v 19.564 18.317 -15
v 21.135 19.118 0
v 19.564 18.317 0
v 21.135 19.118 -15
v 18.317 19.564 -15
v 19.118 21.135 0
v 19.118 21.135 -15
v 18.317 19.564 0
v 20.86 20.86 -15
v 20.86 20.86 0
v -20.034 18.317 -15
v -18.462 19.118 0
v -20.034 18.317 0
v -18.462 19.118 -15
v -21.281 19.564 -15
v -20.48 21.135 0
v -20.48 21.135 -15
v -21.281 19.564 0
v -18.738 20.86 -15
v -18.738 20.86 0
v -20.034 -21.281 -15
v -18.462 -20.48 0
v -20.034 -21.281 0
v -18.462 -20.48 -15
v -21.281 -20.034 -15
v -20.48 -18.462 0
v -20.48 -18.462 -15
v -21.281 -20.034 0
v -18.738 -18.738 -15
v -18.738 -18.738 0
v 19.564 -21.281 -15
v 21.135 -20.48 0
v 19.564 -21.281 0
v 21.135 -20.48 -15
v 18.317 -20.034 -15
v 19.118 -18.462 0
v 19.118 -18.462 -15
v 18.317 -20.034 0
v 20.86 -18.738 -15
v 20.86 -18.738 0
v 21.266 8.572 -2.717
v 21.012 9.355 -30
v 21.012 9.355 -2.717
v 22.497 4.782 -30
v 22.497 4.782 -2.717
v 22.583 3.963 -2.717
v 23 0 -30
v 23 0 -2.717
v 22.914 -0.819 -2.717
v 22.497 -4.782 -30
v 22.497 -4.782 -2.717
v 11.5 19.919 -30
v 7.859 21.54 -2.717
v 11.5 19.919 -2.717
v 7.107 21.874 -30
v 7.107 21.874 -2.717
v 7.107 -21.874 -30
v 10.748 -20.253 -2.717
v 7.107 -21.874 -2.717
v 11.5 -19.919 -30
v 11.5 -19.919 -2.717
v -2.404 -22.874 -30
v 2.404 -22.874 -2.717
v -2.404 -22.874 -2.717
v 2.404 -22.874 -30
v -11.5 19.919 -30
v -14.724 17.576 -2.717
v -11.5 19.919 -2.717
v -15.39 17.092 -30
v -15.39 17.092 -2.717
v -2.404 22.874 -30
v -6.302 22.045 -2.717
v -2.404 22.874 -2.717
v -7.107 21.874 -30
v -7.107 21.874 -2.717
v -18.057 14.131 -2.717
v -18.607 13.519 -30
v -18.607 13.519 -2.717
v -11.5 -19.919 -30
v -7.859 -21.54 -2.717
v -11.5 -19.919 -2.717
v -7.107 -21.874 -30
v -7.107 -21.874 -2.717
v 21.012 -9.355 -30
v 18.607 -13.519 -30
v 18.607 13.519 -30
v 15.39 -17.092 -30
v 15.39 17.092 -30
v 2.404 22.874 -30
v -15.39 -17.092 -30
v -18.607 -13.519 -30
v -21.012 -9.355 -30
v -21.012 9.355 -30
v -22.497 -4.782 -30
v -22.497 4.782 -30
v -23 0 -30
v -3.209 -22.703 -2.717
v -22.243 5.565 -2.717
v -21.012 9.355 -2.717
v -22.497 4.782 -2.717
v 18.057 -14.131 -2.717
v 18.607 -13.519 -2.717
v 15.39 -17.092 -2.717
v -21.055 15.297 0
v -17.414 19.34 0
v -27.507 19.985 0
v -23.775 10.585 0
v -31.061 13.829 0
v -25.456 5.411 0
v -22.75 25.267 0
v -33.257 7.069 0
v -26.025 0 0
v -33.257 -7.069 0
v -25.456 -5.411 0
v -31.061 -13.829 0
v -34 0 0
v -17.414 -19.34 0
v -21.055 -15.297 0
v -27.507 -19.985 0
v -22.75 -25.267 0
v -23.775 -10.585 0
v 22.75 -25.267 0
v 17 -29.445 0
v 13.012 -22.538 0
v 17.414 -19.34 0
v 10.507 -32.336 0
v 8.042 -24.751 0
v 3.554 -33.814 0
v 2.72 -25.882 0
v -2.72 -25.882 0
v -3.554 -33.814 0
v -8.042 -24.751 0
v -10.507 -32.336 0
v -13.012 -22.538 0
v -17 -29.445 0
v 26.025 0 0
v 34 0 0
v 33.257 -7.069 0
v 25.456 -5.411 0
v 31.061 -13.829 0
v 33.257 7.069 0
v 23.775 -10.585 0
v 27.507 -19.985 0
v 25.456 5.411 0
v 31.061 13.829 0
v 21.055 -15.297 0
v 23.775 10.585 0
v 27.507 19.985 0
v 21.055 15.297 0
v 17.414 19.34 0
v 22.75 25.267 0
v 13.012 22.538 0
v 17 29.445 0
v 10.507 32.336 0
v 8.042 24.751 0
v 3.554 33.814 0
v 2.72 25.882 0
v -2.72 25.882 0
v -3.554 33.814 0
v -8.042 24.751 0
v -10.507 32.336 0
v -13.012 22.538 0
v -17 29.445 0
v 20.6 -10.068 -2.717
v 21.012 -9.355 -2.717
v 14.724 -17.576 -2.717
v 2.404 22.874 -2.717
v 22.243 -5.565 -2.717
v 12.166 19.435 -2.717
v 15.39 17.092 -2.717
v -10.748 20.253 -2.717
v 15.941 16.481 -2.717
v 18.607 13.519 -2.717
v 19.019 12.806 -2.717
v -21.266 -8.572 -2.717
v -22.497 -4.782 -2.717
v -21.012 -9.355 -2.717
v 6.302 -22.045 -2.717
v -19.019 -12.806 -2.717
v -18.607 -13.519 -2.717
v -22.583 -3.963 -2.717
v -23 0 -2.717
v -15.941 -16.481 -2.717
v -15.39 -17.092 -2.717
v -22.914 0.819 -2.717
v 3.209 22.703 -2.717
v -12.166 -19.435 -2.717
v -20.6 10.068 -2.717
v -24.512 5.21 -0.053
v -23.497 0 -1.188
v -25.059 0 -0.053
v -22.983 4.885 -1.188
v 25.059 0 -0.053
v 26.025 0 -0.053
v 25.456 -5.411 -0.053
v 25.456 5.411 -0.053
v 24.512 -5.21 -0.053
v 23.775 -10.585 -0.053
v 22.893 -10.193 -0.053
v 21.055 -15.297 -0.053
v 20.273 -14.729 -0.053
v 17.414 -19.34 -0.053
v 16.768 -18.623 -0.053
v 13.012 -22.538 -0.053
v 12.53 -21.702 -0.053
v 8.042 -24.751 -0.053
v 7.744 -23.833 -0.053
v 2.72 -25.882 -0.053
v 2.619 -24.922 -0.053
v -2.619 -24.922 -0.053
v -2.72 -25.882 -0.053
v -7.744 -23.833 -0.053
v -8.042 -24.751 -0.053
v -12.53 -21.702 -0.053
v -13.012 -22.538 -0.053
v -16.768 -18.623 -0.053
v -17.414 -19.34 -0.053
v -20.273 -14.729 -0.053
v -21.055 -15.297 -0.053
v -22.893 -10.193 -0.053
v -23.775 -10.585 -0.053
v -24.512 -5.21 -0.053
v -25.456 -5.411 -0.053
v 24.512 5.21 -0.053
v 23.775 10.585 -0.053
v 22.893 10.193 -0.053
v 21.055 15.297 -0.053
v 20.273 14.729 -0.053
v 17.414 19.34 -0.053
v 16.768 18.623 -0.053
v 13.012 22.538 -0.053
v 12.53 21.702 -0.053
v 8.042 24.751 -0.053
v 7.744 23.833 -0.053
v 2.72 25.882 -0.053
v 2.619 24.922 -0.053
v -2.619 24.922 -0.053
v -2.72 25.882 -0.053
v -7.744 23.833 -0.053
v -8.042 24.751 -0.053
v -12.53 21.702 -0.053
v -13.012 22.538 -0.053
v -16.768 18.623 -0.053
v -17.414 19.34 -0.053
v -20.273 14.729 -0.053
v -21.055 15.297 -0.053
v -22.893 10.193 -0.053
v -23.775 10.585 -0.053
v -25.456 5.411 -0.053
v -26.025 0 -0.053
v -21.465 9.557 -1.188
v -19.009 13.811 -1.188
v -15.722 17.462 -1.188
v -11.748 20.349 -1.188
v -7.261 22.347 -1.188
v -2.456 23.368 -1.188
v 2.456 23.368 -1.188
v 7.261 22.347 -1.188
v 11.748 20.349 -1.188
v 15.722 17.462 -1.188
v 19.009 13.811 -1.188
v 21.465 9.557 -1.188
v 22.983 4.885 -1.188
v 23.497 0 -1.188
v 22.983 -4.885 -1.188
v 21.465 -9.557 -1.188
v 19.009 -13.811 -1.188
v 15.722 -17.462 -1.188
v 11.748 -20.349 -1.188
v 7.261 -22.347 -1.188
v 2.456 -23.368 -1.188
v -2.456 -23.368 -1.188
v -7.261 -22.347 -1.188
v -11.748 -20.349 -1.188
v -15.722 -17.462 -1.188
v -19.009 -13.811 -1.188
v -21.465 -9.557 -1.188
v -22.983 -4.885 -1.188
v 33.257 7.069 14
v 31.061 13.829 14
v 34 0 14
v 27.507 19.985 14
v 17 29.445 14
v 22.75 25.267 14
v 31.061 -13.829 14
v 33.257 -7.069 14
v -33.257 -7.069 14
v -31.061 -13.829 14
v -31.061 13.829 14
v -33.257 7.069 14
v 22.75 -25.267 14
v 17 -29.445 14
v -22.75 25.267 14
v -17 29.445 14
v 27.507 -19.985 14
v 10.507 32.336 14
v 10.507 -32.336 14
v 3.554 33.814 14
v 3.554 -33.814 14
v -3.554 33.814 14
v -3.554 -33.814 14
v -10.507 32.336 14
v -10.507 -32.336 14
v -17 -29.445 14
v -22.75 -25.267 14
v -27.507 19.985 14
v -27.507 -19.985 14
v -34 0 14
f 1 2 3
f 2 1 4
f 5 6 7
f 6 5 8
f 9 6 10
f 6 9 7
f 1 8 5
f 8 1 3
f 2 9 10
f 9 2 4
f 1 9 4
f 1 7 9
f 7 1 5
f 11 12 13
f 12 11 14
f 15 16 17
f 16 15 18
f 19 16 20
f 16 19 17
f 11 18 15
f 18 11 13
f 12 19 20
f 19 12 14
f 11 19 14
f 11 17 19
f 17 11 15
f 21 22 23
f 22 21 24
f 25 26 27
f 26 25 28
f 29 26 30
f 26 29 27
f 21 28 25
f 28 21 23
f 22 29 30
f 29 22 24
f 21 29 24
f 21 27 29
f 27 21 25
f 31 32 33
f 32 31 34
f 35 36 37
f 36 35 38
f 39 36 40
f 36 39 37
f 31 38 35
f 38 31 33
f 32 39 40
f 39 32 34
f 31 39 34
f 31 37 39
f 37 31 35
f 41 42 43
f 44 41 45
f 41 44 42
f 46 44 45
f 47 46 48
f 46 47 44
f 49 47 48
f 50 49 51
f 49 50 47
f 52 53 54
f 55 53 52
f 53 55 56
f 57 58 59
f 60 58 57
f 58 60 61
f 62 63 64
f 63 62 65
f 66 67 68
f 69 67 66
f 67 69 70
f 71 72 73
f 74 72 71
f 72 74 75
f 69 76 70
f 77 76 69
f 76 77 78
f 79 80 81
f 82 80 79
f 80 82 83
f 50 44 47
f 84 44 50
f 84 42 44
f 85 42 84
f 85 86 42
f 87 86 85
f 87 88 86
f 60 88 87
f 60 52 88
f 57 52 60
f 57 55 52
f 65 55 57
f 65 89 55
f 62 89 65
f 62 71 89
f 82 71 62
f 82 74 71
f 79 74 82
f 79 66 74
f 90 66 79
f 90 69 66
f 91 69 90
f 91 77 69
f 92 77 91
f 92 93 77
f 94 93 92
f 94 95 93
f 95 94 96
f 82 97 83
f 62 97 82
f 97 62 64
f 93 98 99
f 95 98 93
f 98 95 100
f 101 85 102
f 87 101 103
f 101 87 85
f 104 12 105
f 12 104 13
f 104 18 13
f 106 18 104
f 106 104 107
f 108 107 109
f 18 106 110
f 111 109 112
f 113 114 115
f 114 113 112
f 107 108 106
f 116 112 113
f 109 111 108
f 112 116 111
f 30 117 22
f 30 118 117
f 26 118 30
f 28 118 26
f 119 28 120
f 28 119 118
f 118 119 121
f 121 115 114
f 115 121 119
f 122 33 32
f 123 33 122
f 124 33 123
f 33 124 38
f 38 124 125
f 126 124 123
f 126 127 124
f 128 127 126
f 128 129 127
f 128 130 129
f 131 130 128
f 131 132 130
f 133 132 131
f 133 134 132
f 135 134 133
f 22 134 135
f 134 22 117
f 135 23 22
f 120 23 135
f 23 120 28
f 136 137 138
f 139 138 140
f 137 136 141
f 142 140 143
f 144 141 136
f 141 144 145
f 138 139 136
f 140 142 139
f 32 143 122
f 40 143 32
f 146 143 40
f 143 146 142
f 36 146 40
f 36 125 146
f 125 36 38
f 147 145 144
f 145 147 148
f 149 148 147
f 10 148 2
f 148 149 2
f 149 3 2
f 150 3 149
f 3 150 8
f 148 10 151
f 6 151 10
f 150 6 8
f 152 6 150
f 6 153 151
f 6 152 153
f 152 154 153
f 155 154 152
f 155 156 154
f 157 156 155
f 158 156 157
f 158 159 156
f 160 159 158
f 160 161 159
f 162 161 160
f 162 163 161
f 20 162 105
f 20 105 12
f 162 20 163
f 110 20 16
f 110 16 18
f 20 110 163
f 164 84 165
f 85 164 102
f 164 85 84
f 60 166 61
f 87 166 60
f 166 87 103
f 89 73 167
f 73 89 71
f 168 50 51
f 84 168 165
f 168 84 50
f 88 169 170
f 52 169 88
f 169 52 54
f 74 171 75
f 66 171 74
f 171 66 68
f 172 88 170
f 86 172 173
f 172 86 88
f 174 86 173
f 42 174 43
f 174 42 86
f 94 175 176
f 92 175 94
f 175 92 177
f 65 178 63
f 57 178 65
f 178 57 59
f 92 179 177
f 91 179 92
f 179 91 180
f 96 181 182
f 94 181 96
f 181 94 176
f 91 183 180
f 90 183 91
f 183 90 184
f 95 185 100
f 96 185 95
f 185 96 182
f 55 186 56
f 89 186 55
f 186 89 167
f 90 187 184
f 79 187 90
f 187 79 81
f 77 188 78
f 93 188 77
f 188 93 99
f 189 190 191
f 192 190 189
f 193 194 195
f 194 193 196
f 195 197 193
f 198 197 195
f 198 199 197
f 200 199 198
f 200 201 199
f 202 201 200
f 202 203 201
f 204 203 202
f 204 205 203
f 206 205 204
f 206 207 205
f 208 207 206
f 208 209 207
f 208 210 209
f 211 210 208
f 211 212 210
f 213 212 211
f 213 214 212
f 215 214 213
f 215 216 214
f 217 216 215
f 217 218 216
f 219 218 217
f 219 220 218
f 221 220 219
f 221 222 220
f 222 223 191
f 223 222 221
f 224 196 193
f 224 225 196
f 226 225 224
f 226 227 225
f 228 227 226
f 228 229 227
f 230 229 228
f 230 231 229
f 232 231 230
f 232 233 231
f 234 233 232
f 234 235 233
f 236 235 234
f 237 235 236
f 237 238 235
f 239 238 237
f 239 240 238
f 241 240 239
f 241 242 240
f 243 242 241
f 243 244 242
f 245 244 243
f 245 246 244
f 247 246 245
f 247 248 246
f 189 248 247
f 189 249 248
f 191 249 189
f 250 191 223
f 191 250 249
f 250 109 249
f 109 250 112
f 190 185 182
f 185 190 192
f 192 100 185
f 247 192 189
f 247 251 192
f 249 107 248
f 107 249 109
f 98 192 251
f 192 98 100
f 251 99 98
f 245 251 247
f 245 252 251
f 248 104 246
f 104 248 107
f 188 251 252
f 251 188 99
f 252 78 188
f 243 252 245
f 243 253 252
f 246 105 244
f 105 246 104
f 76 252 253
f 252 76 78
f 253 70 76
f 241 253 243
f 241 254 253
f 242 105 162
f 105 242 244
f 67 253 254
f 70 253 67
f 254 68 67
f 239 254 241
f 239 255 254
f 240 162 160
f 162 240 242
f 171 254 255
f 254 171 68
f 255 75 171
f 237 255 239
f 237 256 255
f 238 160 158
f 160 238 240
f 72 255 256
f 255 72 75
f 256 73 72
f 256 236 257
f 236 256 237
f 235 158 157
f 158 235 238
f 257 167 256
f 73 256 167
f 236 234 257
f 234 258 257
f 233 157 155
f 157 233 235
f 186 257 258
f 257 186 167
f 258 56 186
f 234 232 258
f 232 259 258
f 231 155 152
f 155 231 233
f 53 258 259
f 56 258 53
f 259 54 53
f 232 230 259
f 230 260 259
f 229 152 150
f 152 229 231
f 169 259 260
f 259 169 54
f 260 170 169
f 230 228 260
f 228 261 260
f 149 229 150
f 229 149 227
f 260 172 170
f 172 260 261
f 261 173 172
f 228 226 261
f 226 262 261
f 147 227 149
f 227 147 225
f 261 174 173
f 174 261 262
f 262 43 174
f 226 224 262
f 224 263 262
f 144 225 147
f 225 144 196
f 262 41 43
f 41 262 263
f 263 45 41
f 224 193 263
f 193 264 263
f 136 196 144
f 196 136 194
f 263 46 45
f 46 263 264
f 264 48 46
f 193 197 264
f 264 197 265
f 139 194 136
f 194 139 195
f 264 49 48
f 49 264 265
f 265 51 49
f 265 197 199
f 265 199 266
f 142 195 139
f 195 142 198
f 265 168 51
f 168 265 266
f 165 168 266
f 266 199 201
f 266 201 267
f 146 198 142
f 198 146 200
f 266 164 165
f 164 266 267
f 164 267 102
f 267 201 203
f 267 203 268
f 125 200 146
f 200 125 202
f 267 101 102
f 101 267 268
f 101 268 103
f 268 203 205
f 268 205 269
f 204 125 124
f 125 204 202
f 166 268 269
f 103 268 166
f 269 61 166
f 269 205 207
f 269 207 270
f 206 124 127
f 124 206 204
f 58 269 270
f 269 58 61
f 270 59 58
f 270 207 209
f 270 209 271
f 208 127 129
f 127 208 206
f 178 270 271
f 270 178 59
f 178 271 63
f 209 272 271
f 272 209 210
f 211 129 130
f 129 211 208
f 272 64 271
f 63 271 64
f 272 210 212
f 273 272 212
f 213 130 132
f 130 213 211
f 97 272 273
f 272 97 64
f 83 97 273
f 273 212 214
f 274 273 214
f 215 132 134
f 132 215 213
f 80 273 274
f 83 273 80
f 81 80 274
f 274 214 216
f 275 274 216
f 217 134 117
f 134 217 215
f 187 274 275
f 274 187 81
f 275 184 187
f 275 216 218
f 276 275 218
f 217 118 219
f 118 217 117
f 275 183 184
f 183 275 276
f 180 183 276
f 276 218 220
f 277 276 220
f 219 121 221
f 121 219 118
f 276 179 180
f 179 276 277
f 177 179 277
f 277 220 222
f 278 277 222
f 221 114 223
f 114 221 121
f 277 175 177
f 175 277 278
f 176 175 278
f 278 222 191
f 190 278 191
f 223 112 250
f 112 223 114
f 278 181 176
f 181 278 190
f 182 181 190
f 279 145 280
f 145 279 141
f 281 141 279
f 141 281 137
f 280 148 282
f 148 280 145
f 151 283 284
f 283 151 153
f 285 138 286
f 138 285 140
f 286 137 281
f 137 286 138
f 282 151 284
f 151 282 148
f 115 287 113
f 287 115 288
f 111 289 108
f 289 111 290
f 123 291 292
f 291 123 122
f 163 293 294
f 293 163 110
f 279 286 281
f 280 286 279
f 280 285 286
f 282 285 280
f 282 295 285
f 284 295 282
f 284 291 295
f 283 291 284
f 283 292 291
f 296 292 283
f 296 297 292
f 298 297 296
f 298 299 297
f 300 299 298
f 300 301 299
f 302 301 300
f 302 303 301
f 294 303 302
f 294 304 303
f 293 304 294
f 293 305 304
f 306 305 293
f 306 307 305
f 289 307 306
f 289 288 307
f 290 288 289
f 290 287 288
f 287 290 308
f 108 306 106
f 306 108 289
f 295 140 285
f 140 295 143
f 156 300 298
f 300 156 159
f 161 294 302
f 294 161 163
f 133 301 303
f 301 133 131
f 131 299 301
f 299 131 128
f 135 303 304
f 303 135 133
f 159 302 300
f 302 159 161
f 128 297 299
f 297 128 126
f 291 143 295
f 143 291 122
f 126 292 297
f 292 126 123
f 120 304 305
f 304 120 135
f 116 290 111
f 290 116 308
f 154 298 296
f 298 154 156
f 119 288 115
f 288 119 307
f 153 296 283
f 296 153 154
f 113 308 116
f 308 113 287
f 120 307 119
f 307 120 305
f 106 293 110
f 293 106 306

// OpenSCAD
union(){
//$fn = 100;

// Adding 2mm for margin
baffle_cutout_diameter = 45+1;
driver_depth = 30;

bolt_circle_diameter = 56; 
bolt_diameter = 3;
bolt_depth = 15;
bolt_height = 5;


// Adding 1mm for margin
plate_diamter = 66+2;
plate_height = 4;

roundover_radius = 25/8;

// Driver Coil
translate([0,0,-driver_depth])
    cylinder(driver_depth,d=baffle_cutout_diameter);

// Roundover for baffel cutout
rotate_extrude(angle=360)
    // Translate up and in 0.1mm to ensure intersection with the plate and baffle cutout cylinder
    translate([baffle_cutout_diameter/2-0.1,-roundover_radius+0.1,])
        //rotate([0,90,0])
        difference(){
            square(roundover_radius);
            translate([roundover_radius,0,0])
            circle(r=roundover_radius);
        }


rotate([0,0,45])
// Front Mouting Screws
for ( i = [bolt_circle_diameter/2,-bolt_circle_diameter/2]){
    translate([i,0,-bolt_depth])
        cylinder(bolt_depth+bolt_height,d=bolt_diameter);
    translate([0,i,-bolt_depth])
        cylinder(bolt_depth+bolt_height,d=bolt_diameter);
}

// Front Mouting Plate
// Extrea headroom for the speaker cone
cylinder(10+plate_height,d=plate_diamter);

}
